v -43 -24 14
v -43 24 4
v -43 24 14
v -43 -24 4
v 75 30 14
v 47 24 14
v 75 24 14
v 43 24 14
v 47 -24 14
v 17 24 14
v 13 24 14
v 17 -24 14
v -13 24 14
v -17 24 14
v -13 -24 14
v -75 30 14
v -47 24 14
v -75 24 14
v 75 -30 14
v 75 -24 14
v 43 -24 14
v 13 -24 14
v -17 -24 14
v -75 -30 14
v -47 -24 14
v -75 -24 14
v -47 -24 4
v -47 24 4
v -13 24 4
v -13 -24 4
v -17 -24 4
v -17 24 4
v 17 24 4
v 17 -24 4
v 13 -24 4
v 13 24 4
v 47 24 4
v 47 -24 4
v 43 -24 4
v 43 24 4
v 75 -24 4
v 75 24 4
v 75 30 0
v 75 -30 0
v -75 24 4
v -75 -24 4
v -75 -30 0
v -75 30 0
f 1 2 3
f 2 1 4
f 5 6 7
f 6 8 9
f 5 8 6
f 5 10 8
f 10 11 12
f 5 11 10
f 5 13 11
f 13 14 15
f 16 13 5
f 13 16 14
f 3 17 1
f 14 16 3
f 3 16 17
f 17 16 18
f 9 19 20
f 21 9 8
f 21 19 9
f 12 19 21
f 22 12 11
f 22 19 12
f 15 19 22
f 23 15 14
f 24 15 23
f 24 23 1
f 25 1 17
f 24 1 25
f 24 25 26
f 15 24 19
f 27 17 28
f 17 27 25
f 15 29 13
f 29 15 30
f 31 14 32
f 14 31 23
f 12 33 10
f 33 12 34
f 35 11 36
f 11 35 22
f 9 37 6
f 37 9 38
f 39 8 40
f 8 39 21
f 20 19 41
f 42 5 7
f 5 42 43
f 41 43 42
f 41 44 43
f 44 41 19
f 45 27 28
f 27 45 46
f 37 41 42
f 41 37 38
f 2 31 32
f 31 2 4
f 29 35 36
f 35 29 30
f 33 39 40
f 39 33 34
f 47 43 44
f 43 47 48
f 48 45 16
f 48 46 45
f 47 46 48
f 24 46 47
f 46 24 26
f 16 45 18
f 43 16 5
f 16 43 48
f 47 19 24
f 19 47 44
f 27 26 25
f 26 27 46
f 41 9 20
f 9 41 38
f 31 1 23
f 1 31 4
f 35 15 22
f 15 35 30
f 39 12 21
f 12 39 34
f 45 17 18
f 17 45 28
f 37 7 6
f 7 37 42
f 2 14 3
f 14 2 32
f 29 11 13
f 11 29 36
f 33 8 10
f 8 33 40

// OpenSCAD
$fn = 32;

// ----------------------------------------------------------------------
// Rib frame 150 x 60 x 14
// 4 ribs at 30 mm pitch
// ----------------------------------------------------------------------

// --- parameters (mm) ---
frame = [150, 60, 4];  // base plate size (x, y, z)
rail_w = 6;            // side rail width
ribs = 4;              // number of ribs
rib_t = 4;             // rib thickness
rib_h = 10;            // rib height above the base plate
pitch = 30;            // pitch between rib centres

// --- derived feature positions (mm) ---
span = (ribs - 1) * pitch;          // = 90   distance between the outer ribs
origin_x = -span / 2;               // = -45   X of the first rib
rib_len = frame[1] - 2 * rail_w + 2;  // = 50   rib length, 1 mm into each rail
feature_centers = [
  [origin_x + 0 * pitch, 0],
  [origin_x + 1 * pitch, 0],
  [origin_x + 2 * pitch, 0],
  [origin_x + 3 * pitch, 0]
];   // rib centre line, drives the rib loop

// base plate, two side rails, then the ribs read straight off feature_centers
union() {
  translate([-frame[0] / 2, -frame[1] / 2, 0]) cube(frame);
  translate([-frame[0] / 2, -frame[1] / 2, 0]) cube([frame[0], rail_w, frame[2] + rib_h]);
  translate([-frame[0] / 2, frame[1] / 2 - rail_w, 0]) cube([frame[0], rail_w, frame[2] + rib_h]);
  for (centre = feature_centers)
    translate([centre[0] - rib_t / 2, centre[1] - rib_len / 2, frame[2] - 1])
      cube([rib_t, rib_len, rib_h + 1]);
}
